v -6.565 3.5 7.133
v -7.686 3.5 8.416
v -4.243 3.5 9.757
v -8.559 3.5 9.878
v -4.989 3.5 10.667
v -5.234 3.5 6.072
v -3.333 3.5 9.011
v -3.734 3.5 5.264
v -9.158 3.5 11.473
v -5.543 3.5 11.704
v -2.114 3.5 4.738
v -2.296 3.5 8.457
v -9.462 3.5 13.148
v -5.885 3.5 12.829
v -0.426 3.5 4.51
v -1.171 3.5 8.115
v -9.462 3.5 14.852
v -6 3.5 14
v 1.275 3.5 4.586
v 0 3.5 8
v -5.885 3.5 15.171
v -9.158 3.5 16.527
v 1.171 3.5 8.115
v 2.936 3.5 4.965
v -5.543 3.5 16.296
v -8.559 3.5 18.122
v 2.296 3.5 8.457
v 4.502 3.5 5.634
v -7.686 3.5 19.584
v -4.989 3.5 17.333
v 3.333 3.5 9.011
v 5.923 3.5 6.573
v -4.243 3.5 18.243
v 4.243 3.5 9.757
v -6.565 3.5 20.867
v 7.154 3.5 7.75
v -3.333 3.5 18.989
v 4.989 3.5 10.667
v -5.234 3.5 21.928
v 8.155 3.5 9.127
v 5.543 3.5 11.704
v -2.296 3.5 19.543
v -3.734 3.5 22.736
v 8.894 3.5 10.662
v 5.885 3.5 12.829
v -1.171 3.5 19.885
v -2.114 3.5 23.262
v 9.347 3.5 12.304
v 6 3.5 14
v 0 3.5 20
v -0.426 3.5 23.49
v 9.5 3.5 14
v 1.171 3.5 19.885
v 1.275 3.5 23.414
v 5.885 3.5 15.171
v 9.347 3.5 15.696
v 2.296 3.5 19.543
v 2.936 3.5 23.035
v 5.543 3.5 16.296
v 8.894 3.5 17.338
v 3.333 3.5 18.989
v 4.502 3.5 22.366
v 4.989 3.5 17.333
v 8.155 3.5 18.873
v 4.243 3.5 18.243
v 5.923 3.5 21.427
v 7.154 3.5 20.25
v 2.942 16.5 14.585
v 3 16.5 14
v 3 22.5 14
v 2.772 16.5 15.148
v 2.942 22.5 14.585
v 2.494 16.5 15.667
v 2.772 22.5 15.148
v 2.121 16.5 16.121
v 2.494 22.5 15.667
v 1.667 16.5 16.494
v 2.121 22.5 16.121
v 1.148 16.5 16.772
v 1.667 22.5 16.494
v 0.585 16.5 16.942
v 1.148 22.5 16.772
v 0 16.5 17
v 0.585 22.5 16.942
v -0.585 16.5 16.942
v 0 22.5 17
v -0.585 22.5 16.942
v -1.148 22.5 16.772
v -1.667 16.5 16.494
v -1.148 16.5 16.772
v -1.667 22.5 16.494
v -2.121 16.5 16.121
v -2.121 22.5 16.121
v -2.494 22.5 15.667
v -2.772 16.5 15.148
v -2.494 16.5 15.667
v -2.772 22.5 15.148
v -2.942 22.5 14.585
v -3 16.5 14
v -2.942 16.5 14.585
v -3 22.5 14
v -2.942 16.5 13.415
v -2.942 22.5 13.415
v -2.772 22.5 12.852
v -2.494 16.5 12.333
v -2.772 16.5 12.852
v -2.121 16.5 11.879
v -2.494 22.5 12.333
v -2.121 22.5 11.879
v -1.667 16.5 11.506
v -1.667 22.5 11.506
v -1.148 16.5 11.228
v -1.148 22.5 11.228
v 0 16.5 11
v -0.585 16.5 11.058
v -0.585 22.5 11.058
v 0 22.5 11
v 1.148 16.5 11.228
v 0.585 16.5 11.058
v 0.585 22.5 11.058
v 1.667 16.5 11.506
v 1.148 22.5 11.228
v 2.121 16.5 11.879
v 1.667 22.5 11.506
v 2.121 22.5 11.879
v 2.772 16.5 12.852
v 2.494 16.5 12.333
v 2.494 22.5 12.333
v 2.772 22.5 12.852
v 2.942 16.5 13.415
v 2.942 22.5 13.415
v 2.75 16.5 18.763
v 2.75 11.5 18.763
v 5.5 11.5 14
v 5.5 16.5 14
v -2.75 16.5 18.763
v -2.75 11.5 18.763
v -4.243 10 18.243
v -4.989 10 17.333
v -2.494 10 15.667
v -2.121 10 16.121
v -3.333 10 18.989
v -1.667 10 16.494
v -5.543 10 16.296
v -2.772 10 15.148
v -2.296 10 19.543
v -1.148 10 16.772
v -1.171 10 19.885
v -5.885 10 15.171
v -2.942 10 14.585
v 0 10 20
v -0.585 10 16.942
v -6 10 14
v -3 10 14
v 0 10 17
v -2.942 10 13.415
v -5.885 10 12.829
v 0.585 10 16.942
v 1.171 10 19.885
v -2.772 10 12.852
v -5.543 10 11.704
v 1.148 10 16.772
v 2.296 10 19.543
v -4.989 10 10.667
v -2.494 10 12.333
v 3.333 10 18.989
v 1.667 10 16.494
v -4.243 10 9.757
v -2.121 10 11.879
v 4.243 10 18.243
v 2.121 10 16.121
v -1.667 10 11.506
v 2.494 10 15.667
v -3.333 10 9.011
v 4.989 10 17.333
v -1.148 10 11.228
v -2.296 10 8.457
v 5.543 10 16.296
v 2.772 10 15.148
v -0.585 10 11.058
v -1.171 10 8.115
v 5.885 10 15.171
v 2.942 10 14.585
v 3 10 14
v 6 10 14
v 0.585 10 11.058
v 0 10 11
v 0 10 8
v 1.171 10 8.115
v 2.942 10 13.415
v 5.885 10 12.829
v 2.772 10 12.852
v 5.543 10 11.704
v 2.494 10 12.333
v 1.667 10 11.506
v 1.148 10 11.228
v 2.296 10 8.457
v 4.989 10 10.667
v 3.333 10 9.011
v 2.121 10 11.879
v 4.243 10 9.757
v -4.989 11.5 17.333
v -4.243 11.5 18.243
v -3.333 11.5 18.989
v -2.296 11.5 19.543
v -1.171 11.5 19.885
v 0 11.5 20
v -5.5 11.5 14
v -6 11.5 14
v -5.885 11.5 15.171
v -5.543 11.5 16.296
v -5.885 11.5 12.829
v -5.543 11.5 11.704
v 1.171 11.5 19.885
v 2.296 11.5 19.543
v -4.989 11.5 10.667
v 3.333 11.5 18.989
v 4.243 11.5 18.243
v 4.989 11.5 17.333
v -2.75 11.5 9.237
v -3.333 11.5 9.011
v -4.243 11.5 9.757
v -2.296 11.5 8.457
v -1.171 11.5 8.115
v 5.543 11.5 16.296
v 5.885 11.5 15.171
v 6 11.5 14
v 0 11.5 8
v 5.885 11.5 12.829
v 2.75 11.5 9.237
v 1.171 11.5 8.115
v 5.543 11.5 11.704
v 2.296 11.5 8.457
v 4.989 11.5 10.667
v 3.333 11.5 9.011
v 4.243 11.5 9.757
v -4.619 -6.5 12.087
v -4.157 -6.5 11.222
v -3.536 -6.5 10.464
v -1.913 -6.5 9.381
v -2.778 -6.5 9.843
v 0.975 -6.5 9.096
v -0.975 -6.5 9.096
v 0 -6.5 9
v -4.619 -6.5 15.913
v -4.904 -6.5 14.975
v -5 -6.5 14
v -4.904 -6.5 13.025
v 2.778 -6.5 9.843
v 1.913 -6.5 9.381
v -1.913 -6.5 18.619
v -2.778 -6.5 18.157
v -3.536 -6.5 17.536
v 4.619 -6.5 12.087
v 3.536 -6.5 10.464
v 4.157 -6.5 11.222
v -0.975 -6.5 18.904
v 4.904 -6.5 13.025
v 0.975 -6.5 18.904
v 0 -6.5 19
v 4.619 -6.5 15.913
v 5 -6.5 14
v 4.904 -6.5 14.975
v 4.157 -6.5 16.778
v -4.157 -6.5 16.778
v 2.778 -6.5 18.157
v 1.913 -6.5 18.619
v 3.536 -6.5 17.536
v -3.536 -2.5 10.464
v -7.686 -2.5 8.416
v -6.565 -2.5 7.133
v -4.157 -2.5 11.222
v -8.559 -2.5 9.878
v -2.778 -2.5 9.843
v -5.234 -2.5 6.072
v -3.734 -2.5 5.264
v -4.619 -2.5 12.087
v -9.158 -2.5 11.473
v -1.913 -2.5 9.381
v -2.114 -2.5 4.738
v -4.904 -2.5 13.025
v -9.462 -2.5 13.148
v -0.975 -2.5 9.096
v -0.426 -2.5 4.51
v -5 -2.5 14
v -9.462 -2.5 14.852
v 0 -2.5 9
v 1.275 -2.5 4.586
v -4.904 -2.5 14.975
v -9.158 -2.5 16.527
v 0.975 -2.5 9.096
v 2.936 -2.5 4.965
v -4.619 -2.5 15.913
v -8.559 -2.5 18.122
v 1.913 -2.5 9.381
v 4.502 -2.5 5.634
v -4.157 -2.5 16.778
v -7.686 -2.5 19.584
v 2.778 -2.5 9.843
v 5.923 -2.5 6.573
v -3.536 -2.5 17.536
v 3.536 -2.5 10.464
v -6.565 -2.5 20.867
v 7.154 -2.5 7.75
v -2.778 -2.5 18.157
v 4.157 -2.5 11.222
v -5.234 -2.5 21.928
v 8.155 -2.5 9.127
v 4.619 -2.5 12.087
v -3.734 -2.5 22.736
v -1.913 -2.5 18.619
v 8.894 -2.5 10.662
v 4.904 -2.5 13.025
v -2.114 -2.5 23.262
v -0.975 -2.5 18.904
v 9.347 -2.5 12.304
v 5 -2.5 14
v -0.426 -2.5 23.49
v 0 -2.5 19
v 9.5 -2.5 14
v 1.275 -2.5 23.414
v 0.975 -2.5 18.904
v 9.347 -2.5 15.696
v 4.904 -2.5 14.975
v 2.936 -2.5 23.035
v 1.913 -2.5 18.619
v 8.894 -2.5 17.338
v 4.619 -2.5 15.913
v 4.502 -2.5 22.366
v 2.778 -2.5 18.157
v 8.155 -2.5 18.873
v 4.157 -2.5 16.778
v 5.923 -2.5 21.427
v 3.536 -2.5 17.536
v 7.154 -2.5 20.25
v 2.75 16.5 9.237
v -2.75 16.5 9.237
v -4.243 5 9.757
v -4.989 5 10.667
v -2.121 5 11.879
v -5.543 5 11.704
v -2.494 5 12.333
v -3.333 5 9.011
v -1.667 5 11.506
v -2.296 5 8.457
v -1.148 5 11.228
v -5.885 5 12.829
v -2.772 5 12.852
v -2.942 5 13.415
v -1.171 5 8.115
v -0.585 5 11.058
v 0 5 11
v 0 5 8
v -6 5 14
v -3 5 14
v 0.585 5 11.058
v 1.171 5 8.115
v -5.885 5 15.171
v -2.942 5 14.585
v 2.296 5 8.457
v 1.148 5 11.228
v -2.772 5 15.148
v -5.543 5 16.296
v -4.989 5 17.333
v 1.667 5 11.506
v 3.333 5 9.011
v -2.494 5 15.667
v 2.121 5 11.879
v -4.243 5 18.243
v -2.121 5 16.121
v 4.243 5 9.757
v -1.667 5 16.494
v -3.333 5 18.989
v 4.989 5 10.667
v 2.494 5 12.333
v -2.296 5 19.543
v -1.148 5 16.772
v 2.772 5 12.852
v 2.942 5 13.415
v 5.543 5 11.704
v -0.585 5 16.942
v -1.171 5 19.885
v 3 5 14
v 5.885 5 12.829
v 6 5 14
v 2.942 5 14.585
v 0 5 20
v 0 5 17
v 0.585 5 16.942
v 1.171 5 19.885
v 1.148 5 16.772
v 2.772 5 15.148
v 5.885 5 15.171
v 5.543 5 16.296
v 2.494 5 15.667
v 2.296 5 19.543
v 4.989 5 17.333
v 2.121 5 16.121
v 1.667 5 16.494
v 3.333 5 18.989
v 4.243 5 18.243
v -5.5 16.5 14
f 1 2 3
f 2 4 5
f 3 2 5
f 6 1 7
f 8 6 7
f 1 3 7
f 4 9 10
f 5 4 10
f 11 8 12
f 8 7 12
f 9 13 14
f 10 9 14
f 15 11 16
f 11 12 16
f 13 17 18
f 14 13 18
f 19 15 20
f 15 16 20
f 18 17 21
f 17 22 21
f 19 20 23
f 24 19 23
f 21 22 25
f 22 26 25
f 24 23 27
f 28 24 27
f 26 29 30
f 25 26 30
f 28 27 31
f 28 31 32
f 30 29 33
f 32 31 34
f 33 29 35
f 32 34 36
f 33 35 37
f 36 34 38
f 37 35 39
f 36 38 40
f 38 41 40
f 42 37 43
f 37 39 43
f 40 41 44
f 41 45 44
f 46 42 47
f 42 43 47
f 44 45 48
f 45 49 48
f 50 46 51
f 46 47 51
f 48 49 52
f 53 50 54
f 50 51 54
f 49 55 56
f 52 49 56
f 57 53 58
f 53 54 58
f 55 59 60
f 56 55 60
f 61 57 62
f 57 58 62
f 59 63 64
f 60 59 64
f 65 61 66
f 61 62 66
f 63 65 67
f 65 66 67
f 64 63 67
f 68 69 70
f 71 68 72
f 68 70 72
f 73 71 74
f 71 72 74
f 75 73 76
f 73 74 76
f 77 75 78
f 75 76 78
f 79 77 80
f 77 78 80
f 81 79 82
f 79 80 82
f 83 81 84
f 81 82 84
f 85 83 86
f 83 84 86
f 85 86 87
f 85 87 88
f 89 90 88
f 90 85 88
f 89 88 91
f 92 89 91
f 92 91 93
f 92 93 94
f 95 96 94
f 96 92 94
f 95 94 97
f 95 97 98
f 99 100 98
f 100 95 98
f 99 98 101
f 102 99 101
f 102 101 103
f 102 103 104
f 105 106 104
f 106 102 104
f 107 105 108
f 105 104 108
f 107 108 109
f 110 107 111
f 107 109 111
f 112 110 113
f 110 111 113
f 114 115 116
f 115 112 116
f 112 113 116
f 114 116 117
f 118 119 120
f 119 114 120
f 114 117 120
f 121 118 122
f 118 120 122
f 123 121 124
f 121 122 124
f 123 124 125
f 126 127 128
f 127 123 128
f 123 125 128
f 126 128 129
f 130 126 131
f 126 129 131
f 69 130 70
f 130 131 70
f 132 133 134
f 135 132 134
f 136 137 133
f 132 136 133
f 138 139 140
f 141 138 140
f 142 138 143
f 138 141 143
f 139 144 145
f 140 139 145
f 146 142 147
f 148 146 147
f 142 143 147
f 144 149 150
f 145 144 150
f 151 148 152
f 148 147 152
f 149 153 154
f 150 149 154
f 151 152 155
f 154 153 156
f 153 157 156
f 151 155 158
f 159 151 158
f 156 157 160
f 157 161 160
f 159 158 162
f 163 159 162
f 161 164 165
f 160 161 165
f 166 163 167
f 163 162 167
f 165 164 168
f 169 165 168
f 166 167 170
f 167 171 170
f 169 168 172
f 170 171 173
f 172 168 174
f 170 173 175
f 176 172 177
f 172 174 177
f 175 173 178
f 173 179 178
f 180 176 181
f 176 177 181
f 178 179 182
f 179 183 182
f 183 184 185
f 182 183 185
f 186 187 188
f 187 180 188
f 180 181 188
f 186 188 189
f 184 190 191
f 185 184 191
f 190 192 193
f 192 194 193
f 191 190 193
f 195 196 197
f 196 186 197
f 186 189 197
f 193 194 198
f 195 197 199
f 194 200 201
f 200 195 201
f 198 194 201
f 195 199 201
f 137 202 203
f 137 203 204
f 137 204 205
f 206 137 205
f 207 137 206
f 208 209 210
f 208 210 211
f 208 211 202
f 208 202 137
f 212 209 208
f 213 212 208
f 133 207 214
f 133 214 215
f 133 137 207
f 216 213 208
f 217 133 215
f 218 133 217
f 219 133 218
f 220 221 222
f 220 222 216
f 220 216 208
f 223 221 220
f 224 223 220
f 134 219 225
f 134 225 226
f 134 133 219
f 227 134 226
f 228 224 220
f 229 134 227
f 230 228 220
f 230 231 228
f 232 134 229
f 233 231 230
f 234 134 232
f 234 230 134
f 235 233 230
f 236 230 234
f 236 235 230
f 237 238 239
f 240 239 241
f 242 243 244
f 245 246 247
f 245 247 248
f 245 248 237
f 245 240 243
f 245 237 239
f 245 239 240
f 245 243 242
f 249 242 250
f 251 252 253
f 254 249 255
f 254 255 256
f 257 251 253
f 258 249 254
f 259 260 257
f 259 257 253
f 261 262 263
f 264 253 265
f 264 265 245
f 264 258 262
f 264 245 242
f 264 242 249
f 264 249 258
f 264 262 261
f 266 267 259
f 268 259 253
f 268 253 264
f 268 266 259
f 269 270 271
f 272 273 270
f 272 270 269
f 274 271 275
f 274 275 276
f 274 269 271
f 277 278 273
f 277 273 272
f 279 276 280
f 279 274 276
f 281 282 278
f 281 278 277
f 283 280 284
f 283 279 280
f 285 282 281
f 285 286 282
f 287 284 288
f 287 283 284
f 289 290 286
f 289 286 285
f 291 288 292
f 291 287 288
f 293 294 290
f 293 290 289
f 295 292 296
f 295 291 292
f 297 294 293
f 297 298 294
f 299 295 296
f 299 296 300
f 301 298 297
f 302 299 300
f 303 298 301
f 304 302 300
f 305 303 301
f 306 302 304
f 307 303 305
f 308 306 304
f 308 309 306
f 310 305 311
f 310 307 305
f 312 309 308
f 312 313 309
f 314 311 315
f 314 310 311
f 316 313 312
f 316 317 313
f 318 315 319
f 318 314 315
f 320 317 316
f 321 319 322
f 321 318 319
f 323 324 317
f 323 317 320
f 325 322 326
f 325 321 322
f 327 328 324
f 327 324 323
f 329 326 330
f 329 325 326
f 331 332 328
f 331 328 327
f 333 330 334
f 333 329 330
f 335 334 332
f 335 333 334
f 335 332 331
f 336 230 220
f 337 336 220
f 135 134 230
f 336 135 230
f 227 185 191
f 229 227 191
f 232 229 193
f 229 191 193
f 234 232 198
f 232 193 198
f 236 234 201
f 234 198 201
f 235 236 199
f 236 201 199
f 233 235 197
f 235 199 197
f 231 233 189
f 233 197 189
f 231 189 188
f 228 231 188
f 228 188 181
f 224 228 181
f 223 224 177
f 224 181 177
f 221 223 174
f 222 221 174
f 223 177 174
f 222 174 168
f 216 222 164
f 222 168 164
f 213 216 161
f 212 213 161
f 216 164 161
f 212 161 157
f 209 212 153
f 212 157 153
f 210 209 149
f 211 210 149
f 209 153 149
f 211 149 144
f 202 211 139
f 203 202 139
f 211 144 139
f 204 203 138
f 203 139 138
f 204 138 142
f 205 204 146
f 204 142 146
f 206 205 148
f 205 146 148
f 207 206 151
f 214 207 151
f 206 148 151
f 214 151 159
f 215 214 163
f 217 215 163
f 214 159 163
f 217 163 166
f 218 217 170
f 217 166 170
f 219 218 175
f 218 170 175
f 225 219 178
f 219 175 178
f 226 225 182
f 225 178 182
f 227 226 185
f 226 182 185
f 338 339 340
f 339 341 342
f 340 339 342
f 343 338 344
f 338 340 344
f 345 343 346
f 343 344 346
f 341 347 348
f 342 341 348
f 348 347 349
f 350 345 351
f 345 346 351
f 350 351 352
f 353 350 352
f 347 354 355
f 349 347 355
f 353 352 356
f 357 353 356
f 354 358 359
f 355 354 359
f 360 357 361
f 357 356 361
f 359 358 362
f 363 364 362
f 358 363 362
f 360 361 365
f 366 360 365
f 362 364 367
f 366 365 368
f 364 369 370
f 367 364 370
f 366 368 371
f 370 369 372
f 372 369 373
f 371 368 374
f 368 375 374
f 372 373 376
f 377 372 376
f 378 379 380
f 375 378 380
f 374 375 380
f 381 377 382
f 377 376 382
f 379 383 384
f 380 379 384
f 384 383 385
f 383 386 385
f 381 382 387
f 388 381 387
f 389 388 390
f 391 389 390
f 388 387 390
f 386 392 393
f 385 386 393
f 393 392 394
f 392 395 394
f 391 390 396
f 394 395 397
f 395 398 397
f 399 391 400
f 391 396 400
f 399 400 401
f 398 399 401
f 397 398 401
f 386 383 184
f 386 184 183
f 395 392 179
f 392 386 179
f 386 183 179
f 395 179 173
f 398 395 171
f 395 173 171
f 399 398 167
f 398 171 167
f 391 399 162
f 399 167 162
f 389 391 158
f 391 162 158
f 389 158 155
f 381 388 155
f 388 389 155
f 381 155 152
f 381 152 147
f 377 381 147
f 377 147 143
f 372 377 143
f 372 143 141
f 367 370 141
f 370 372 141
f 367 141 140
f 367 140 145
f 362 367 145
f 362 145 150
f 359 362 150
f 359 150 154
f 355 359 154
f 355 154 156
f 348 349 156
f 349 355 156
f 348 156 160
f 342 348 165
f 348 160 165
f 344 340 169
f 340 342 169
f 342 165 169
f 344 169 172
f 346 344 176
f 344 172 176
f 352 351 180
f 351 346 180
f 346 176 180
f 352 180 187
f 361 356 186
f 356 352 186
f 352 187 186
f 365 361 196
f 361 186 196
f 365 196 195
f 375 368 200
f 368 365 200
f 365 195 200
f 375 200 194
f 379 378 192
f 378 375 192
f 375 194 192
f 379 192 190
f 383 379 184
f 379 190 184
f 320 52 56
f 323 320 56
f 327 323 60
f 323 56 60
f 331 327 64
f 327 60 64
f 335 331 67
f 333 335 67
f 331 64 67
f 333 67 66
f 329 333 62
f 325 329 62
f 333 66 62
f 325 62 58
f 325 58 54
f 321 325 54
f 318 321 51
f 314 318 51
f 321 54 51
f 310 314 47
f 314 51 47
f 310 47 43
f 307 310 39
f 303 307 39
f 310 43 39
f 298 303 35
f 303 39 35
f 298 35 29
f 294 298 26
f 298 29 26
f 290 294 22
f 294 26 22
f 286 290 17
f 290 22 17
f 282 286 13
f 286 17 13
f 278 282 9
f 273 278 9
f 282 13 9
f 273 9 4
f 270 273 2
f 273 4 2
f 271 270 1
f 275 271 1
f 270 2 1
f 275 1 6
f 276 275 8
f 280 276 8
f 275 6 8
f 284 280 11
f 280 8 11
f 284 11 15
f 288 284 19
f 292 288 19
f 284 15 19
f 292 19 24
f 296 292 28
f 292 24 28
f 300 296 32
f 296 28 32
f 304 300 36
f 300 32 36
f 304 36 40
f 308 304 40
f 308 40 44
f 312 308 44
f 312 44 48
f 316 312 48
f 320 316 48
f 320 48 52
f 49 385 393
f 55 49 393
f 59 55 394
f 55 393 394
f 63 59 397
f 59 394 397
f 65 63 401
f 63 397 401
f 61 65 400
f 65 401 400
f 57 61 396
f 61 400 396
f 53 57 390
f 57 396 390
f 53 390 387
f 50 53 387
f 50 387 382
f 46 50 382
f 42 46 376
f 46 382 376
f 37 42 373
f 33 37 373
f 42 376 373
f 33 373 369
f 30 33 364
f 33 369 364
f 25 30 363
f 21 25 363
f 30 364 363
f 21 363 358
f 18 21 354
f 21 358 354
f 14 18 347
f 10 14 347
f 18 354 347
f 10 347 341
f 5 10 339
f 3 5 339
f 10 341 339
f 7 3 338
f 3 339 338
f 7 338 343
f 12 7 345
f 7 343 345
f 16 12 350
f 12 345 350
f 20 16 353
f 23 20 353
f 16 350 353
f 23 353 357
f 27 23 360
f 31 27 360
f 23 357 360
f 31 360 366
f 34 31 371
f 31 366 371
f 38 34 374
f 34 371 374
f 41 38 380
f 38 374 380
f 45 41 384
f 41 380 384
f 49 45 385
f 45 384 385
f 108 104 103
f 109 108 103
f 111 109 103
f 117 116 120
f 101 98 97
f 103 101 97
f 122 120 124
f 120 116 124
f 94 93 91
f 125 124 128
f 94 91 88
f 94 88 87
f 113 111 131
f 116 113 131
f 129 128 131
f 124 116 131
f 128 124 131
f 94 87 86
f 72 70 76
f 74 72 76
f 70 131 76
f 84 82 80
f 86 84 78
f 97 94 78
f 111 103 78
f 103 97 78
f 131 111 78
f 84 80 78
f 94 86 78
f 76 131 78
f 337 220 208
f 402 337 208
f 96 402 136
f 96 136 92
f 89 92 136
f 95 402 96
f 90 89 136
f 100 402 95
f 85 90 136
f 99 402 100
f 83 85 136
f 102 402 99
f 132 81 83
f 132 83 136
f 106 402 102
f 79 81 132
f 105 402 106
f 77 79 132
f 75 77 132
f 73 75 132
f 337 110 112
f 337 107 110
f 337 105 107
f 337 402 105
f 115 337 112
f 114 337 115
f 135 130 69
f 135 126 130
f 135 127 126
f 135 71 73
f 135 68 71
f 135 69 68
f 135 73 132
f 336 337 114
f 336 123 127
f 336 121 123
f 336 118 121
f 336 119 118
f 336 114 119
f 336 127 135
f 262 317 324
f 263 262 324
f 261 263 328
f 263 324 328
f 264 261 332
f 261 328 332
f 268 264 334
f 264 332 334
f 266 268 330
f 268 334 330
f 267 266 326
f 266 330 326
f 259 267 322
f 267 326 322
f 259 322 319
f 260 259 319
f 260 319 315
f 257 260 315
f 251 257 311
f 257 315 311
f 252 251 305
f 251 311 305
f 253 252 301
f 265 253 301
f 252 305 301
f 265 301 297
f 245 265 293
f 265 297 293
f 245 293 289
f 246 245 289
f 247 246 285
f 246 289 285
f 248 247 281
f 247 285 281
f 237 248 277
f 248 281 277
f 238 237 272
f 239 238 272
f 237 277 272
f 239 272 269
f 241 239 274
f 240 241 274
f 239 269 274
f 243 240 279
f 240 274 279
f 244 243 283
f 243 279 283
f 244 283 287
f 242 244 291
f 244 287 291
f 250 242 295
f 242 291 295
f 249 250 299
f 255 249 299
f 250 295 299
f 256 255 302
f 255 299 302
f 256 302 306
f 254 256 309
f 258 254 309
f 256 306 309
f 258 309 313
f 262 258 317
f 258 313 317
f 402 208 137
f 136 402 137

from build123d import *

# Parameters (mm, degrees)
CYLINDER008_R           = 6
CYLINDER008_DEPTH       = 1.5
PRISM001_DEPTH          = 5
FUSION006003_ROLL_ANGLE = -90
CYLINDER006_R           = 3
CYLINDER006_DEPTH       = 25
CYLINDER007_R           = 5
CYLINDER007_DEPTH       = 4
FUSION006002_ROLL_ANGLE = 90
CYLINDER005_R           = 9.5
CYLINDER005_DEPTH       = 6
CYLINDER005_ROLL_ANGLE  = 90
CYLINDER009_R           = 6
CYLINDER009_DEPTH       = 1.5
CYLINDER009_ROLL_ANGLE  = 90


with BuildPart() as cylinder006:
    # Cylinder008 → Cylinder008 (new body)
    with BuildSketch(Plane.XY):
        Circle(CYLINDER008_R)
    extrude(amount=CYLINDER008_DEPTH)


with BuildPart() as fusion006003:
    # Prism001 → Prism001 (new body)
    with BuildSketch(Plane.XY.offset(1.5)):
        Polygon((5.5, 0), (2.75, 4.76314), (-2.75, 4.76314), (-5.5, 0), (-2.75, -4.76314), (2.75, -4.76314), align=None)
    extrude(amount=PRISM001_DEPTH)

    # Fusion006003: union Cylinder006
    add(cylinder006.part)


with BuildPart() as fusion006003_1:
    # Fusion006003 roll: moved
    add(fusion006003.part.rotate(Axis((0, 0, 0), (1, 0, 0)), FUSION006003_ROLL_ANGLE))


with BuildPart() as fusion006003_2:
    # Fusion006003 placement: moved
    add(fusion006003_1.part.moved(Location((0, 10, 14))))


with BuildPart() as cylinder004:
    # Cylinder006 → Cylinder006 (new body)
    with BuildSketch(Plane.XY):
        Circle(CYLINDER006_R)
    extrude(amount=CYLINDER006_DEPTH)


with BuildPart() as belt_bearing_screw:
    # Cylinder007 → Cylinder007 (new body)
    with BuildSketch(Plane.XY.offset(25)):
        Circle(CYLINDER007_R)
    extrude(amount=CYLINDER007_DEPTH)

    # Fusion006002: union Cylinder004
    add(cylinder004.part)


with BuildPart() as belt_bearing_screw_1:
    # Fusion006002 roll: moved
    add(belt_bearing_screw.part.rotate(Axis((0, 0, 0), (1, 0, 0)), FUSION006002_ROLL_ANGLE))


with BuildPart() as belt_bearing_screw_2:
    # Fusion006002 placement: moved
    add(belt_bearing_screw_1.part.moved(Location((0, 22.5, 14))))


with BuildPart() as belt_bearing:
    # Cylinder005 → Cylinder005 (new body)
    with BuildSketch(Plane.XY):
        Circle(CYLINDER005_R)
    extrude(amount=CYLINDER005_DEPTH)


with BuildPart() as belt_bearing_1:
    # Cylinder005 roll: moved
    add(belt_bearing.part.rotate(Axis((0, 0, 0), (1, 0, 0)), CYLINDER005_ROLL_ANGLE))


with BuildPart() as belt_bearing_2:
    # Cylinder005 placement: moved
    add(belt_bearing_1.part.moved(Location((0, 3.5, 14))))


with BuildPart() as belt_holder:
    # Cylinder009 → Cylinder009 (new body)
    with BuildSketch(Plane.XY):
        Circle(CYLINDER009_R)
    extrude(amount=CYLINDER009_DEPTH)


with BuildPart() as belt_holder_1:
    # Cylinder009 roll: moved
    add(belt_holder.part.rotate(Axis((0, 0, 0), (1, 0, 0)), CYLINDER009_ROLL_ANGLE))


with BuildPart() as belt_holder_2:
    # Cylinder009 placement: moved
    add(belt_holder_1.part.moved(Location((0, 5, 14))))

    # Fusion006004: union Fusion006003, Belt_Bearing_Screw, Belt_Bearing
    add(fusion006003_2.part)
    add(belt_bearing_screw_2.part)
    add(belt_bearing_2.part)


solid = belt_holder_2.part
